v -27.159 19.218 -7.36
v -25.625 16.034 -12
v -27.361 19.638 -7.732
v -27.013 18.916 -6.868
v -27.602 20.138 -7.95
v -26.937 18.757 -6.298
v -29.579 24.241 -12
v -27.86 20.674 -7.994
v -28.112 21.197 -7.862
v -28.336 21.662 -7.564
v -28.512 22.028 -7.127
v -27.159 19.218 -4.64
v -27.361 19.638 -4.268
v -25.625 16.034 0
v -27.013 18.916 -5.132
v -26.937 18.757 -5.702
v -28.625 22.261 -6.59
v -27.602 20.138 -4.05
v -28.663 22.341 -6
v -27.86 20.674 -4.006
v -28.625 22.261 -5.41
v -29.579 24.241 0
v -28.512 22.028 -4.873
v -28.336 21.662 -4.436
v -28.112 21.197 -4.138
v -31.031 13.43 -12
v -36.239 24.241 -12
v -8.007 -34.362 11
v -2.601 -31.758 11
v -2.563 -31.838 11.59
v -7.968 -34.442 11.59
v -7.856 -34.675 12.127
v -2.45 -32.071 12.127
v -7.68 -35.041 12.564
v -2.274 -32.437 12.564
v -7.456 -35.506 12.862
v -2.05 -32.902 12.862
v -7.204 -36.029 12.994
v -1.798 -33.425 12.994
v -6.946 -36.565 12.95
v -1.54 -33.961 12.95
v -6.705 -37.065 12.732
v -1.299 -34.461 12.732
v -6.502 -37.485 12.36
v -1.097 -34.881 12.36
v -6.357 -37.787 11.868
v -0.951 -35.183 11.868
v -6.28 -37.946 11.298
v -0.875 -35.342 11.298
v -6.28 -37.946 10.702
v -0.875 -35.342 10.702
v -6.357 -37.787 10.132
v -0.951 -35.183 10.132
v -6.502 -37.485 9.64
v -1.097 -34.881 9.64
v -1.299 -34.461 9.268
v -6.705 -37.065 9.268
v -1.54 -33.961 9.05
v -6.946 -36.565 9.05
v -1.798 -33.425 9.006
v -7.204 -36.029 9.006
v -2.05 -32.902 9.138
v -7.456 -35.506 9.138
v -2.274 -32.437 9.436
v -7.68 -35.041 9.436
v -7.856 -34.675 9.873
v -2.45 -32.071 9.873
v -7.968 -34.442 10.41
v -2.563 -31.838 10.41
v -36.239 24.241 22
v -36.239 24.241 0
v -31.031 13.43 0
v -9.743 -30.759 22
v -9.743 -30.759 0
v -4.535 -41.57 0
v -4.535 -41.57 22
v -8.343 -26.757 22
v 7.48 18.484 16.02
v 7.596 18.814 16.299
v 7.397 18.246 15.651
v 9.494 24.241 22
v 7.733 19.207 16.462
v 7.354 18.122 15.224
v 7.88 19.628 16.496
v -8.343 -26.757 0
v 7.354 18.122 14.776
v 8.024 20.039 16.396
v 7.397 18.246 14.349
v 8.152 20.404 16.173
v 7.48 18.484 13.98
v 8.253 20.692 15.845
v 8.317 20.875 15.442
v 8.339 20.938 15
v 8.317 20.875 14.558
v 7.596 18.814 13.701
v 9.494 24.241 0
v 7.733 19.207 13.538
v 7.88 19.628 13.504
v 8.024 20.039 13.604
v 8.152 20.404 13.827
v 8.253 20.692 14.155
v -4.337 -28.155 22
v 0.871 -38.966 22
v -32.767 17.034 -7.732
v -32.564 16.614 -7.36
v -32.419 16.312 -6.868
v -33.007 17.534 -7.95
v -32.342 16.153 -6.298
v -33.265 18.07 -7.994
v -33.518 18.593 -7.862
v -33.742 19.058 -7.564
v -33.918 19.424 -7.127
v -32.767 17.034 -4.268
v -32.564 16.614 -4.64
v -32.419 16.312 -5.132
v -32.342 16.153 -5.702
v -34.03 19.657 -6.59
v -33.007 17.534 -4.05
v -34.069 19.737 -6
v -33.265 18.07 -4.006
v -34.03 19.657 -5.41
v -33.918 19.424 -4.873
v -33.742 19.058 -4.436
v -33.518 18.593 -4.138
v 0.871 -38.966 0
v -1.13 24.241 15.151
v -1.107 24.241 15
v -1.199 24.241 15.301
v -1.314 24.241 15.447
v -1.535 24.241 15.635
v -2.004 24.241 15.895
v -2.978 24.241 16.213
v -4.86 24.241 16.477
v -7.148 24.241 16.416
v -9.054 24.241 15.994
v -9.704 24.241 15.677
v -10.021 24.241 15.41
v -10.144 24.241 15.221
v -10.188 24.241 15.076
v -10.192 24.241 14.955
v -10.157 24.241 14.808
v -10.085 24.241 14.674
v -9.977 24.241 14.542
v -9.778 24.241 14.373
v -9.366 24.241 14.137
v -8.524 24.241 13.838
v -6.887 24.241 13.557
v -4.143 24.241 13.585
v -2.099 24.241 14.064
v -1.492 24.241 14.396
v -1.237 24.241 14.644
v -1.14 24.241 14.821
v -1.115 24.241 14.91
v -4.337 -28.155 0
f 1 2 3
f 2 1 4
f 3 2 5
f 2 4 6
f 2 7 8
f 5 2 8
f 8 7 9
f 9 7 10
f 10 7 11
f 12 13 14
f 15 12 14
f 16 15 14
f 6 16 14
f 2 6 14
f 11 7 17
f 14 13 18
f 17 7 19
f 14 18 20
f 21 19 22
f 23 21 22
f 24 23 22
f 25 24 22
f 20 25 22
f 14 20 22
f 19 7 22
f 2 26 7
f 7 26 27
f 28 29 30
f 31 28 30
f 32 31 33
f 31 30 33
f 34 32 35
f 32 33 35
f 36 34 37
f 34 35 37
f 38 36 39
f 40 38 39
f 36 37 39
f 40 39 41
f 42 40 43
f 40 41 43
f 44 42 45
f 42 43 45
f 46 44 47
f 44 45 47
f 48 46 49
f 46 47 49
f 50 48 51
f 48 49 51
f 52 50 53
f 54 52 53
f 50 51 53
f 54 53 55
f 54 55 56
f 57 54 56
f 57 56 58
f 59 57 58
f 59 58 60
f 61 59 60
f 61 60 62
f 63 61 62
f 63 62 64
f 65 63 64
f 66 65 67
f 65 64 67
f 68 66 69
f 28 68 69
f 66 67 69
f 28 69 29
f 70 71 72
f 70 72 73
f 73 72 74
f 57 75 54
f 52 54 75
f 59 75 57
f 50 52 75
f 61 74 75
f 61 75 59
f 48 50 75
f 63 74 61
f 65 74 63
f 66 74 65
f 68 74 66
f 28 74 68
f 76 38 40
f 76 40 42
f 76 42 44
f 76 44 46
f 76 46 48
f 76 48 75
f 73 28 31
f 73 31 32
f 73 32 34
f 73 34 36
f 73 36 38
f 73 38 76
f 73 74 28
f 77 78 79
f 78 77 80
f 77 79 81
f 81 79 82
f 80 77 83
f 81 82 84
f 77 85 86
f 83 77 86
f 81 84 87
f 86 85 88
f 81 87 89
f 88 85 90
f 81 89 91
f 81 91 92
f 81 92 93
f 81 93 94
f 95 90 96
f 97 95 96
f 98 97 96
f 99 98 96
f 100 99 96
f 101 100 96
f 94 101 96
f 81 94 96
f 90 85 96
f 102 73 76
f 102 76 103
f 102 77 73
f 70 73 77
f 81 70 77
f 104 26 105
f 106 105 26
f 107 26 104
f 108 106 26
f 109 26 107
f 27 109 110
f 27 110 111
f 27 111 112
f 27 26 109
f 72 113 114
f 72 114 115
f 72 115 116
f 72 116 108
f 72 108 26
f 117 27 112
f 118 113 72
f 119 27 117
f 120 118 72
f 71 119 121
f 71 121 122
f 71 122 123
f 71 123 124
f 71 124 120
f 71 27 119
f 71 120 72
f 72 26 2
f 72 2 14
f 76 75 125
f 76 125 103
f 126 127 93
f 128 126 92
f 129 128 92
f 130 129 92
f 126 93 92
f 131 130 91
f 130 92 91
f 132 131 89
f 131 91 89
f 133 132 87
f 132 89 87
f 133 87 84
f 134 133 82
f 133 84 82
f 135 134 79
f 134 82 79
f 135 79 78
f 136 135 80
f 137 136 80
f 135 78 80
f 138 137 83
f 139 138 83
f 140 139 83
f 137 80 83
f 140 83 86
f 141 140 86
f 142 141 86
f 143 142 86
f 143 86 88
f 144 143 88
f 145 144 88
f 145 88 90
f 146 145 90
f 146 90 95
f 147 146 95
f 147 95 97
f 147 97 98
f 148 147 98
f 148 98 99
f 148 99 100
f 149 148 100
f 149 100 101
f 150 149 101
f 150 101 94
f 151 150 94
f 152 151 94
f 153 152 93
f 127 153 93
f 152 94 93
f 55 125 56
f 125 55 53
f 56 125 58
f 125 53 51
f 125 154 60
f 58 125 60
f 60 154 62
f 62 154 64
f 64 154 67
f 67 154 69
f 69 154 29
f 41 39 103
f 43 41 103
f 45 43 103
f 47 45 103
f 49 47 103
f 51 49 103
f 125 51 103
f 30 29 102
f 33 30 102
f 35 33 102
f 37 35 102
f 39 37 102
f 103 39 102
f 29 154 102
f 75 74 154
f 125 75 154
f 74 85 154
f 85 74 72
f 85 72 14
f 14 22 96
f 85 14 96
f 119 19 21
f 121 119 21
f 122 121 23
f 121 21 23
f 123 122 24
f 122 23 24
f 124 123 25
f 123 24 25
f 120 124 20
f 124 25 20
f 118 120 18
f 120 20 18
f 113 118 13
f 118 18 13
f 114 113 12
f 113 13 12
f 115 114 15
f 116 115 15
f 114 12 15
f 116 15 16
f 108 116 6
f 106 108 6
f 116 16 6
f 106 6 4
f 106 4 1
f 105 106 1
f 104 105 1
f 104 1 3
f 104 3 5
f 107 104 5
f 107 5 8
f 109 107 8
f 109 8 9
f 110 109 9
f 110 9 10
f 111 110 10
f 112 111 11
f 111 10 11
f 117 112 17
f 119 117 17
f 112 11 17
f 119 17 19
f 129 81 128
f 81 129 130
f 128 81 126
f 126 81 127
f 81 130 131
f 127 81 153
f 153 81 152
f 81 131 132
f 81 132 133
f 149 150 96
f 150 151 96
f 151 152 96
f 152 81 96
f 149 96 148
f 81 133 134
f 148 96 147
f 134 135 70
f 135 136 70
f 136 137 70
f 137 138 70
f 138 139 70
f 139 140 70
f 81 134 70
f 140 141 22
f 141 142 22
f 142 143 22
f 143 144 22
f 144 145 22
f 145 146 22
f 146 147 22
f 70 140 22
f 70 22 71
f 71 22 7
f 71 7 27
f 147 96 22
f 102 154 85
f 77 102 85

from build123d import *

# Parameters (mm, degrees)
BOSS_EXTRUDE1_DEPTH = 22
SKETCH6_W           = 12
SKETCH6_H           = 12
SKETCH6_W_2         = 22
BOSS_EXTRUDE4_DEPTH = 6
BOSS_EXTRUDE5_DEPTH = 22
SKETCH9_R           = 2
CUT_EXTRUDE9_DEPTH  = 6
SKETCH10_R          = 1.5
CUT_EXTRUDE10_DEPTH = 36
CUT_EXTRUDE11_DEPTH = 36


with BuildPart() as part:
    # Sketch1 → Boss-Extrude1 (new body)
    with BuildSketch(Plane.XY):
        Polygon((-36.238637744, 24.241346543), (-9.742760301, -30.758653457), (9.494123696, 24.241346543), align=None)
    extrude(amount=BOSS_EXTRUDE1_DEPTH)

    # Sketch6 → Boss-Extrude4 (add)
    with BuildSketch(Plane(origin=(-19.934259386, -9.603194429, 0), x_dir=(0, 0, 1), z_dir=(-0.9009094793526655, -0.4340070391278342, 0))):
        with Locations((-6, 31.567082762)):
            Rectangle(SKETCH6_W, SKETCH6_H)
        with Locations((11, -29.48233592)):
            Rectangle(SKETCH6_W_2, SKETCH6_H)
    extrude(amount=-BOSS_EXTRUDE4_DEPTH)


with BuildPart() as boss_extrude4_piece_1:
    # of the separate pieces the step leaves, piece 1, a body of its own (boss_extrude4_pieces)
    add(part.part.solids().sort_by_distance((-36.238637744, 24.241346543, 0))[0])



with BuildPart() as boss_extrude4_piece_2:
    # of the separate pieces the step leaves, piece 2, a body of its own (boss_extrude4_pieces)
    add(part.part.solids().sort_by_distance((-4.337303425, -28.154611222, 0))[0])


with BuildPart() as boss_extrude4_piece_1_1:
    add(boss_extrude4_piece_1.part)

    add(boss_extrude4_piece_2.part)  # Boss-Extrude5 merges Boss-Extrude4 piece 2
    # Sketch8 → Boss-Extrude5 (add)
    with BuildSketch(Plane(origin=(0, 0, 0), x_dir=(-1, 0, 0), z_dir=(0, 0, -1))):
        Polygon((9.742760301, -30.758653457), (4.337303425, -28.154611222), (8.343083331, -26.756849768), align=None)
    extrude(amount=-BOSS_EXTRUDE5_DEPTH)

    # Sketch9 → Cut-Extrude9 (cut)
    with BuildSketch(Plane(origin=(-14.52880251, -6.999152194, 0), x_dir=(0, 0, -1), z_dir=(0.9009094793526653, 0.43400703912783434, 0))):
        with Locations(Location((6, 30.567082762, 0), (0, 0, 90))):
            Circle(SKETCH9_R)
        with Locations(Location((-11, -29.48233592, 0), (0, 0, 90))):
            Circle(SKETCH9_R)
    extrude(amount=-CUT_EXTRUDE9_DEPTH, mode=Mode.SUBTRACT)

    # Sketch10 → Cut-Extrude10 (cut)
    with BuildSketch(Plane(origin=(0.904752149, -0.316447493, 0), x_dir=(0, 0, -1), z_dir=(0.9439285225355003, -0.3301498816355197, 0))):
        with Locations(Location((-15, 21.016582241, 0), (0, 0, 90))):
            Circle(SKETCH10_R)
    extrude(amount=-CUT_EXTRUDE10_DEPTH, mode=Mode.SUBTRACT)

    # Sketch11 → Cut-Extrude11 (cut)
    with BuildSketch(Plane.XY):
        Polygon((-36.238637744, 24.241346543), (-29.578701161, 24.241346543), (-30.833180868, 26.845388778), align=None)
    extrude(amount=-CUT_EXTRUDE11_DEPTH, mode=Mode.SUBTRACT)


solid = boss_extrude4_piece_1_1.part
